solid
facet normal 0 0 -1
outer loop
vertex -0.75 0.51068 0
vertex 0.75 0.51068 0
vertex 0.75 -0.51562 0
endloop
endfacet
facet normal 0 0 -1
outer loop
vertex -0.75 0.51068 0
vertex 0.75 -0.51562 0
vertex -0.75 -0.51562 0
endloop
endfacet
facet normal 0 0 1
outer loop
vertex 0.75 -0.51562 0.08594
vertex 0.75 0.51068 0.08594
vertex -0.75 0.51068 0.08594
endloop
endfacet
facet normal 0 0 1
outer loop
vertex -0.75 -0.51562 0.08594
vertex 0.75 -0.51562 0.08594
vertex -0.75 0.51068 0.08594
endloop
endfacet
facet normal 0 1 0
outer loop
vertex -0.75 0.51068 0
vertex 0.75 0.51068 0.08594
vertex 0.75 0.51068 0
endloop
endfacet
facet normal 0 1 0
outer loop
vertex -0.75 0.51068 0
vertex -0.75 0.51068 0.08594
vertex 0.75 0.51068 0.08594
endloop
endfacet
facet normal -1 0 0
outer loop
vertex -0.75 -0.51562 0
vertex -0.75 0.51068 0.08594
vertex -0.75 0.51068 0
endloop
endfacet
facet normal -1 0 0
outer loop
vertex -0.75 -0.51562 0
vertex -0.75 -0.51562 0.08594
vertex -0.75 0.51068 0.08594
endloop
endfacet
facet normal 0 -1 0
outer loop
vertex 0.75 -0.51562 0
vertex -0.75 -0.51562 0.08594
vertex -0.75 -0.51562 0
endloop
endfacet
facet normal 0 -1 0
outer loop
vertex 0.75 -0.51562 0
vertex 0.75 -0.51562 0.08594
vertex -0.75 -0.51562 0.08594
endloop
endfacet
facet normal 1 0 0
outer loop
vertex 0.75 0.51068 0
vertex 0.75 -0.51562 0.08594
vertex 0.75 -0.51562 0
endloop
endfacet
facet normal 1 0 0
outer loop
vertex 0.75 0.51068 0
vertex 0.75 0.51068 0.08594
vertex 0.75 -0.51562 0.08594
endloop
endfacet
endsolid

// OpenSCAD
EPS = 0.01;

translate([-0.75, -0.515625, 0.0])
linear_extrude(height=0.0859375)
difference() {
    union() {
        polygon(points=[[1.5, 0.0], [1.5, 1.0263157894736843], [0.0, 1.0263157894736843], [0.0, 0.0]]);
        translate([0.3157894736842105, 0.26842105263157895])
        circle(r=0.04736842105263158 + EPS);
        translate([0.3157894736842105, 0.7578947368421053])
        circle(r=0.04736842105263158 + EPS);
        translate([1.1842105263157896, 0.26842105263157895])
        circle(r=0.04736842105263158 + EPS);
        translate([1.1842105263157896, 0.7578947368421053])
        circle(r=0.04736842105263158 + EPS);
    }
}
